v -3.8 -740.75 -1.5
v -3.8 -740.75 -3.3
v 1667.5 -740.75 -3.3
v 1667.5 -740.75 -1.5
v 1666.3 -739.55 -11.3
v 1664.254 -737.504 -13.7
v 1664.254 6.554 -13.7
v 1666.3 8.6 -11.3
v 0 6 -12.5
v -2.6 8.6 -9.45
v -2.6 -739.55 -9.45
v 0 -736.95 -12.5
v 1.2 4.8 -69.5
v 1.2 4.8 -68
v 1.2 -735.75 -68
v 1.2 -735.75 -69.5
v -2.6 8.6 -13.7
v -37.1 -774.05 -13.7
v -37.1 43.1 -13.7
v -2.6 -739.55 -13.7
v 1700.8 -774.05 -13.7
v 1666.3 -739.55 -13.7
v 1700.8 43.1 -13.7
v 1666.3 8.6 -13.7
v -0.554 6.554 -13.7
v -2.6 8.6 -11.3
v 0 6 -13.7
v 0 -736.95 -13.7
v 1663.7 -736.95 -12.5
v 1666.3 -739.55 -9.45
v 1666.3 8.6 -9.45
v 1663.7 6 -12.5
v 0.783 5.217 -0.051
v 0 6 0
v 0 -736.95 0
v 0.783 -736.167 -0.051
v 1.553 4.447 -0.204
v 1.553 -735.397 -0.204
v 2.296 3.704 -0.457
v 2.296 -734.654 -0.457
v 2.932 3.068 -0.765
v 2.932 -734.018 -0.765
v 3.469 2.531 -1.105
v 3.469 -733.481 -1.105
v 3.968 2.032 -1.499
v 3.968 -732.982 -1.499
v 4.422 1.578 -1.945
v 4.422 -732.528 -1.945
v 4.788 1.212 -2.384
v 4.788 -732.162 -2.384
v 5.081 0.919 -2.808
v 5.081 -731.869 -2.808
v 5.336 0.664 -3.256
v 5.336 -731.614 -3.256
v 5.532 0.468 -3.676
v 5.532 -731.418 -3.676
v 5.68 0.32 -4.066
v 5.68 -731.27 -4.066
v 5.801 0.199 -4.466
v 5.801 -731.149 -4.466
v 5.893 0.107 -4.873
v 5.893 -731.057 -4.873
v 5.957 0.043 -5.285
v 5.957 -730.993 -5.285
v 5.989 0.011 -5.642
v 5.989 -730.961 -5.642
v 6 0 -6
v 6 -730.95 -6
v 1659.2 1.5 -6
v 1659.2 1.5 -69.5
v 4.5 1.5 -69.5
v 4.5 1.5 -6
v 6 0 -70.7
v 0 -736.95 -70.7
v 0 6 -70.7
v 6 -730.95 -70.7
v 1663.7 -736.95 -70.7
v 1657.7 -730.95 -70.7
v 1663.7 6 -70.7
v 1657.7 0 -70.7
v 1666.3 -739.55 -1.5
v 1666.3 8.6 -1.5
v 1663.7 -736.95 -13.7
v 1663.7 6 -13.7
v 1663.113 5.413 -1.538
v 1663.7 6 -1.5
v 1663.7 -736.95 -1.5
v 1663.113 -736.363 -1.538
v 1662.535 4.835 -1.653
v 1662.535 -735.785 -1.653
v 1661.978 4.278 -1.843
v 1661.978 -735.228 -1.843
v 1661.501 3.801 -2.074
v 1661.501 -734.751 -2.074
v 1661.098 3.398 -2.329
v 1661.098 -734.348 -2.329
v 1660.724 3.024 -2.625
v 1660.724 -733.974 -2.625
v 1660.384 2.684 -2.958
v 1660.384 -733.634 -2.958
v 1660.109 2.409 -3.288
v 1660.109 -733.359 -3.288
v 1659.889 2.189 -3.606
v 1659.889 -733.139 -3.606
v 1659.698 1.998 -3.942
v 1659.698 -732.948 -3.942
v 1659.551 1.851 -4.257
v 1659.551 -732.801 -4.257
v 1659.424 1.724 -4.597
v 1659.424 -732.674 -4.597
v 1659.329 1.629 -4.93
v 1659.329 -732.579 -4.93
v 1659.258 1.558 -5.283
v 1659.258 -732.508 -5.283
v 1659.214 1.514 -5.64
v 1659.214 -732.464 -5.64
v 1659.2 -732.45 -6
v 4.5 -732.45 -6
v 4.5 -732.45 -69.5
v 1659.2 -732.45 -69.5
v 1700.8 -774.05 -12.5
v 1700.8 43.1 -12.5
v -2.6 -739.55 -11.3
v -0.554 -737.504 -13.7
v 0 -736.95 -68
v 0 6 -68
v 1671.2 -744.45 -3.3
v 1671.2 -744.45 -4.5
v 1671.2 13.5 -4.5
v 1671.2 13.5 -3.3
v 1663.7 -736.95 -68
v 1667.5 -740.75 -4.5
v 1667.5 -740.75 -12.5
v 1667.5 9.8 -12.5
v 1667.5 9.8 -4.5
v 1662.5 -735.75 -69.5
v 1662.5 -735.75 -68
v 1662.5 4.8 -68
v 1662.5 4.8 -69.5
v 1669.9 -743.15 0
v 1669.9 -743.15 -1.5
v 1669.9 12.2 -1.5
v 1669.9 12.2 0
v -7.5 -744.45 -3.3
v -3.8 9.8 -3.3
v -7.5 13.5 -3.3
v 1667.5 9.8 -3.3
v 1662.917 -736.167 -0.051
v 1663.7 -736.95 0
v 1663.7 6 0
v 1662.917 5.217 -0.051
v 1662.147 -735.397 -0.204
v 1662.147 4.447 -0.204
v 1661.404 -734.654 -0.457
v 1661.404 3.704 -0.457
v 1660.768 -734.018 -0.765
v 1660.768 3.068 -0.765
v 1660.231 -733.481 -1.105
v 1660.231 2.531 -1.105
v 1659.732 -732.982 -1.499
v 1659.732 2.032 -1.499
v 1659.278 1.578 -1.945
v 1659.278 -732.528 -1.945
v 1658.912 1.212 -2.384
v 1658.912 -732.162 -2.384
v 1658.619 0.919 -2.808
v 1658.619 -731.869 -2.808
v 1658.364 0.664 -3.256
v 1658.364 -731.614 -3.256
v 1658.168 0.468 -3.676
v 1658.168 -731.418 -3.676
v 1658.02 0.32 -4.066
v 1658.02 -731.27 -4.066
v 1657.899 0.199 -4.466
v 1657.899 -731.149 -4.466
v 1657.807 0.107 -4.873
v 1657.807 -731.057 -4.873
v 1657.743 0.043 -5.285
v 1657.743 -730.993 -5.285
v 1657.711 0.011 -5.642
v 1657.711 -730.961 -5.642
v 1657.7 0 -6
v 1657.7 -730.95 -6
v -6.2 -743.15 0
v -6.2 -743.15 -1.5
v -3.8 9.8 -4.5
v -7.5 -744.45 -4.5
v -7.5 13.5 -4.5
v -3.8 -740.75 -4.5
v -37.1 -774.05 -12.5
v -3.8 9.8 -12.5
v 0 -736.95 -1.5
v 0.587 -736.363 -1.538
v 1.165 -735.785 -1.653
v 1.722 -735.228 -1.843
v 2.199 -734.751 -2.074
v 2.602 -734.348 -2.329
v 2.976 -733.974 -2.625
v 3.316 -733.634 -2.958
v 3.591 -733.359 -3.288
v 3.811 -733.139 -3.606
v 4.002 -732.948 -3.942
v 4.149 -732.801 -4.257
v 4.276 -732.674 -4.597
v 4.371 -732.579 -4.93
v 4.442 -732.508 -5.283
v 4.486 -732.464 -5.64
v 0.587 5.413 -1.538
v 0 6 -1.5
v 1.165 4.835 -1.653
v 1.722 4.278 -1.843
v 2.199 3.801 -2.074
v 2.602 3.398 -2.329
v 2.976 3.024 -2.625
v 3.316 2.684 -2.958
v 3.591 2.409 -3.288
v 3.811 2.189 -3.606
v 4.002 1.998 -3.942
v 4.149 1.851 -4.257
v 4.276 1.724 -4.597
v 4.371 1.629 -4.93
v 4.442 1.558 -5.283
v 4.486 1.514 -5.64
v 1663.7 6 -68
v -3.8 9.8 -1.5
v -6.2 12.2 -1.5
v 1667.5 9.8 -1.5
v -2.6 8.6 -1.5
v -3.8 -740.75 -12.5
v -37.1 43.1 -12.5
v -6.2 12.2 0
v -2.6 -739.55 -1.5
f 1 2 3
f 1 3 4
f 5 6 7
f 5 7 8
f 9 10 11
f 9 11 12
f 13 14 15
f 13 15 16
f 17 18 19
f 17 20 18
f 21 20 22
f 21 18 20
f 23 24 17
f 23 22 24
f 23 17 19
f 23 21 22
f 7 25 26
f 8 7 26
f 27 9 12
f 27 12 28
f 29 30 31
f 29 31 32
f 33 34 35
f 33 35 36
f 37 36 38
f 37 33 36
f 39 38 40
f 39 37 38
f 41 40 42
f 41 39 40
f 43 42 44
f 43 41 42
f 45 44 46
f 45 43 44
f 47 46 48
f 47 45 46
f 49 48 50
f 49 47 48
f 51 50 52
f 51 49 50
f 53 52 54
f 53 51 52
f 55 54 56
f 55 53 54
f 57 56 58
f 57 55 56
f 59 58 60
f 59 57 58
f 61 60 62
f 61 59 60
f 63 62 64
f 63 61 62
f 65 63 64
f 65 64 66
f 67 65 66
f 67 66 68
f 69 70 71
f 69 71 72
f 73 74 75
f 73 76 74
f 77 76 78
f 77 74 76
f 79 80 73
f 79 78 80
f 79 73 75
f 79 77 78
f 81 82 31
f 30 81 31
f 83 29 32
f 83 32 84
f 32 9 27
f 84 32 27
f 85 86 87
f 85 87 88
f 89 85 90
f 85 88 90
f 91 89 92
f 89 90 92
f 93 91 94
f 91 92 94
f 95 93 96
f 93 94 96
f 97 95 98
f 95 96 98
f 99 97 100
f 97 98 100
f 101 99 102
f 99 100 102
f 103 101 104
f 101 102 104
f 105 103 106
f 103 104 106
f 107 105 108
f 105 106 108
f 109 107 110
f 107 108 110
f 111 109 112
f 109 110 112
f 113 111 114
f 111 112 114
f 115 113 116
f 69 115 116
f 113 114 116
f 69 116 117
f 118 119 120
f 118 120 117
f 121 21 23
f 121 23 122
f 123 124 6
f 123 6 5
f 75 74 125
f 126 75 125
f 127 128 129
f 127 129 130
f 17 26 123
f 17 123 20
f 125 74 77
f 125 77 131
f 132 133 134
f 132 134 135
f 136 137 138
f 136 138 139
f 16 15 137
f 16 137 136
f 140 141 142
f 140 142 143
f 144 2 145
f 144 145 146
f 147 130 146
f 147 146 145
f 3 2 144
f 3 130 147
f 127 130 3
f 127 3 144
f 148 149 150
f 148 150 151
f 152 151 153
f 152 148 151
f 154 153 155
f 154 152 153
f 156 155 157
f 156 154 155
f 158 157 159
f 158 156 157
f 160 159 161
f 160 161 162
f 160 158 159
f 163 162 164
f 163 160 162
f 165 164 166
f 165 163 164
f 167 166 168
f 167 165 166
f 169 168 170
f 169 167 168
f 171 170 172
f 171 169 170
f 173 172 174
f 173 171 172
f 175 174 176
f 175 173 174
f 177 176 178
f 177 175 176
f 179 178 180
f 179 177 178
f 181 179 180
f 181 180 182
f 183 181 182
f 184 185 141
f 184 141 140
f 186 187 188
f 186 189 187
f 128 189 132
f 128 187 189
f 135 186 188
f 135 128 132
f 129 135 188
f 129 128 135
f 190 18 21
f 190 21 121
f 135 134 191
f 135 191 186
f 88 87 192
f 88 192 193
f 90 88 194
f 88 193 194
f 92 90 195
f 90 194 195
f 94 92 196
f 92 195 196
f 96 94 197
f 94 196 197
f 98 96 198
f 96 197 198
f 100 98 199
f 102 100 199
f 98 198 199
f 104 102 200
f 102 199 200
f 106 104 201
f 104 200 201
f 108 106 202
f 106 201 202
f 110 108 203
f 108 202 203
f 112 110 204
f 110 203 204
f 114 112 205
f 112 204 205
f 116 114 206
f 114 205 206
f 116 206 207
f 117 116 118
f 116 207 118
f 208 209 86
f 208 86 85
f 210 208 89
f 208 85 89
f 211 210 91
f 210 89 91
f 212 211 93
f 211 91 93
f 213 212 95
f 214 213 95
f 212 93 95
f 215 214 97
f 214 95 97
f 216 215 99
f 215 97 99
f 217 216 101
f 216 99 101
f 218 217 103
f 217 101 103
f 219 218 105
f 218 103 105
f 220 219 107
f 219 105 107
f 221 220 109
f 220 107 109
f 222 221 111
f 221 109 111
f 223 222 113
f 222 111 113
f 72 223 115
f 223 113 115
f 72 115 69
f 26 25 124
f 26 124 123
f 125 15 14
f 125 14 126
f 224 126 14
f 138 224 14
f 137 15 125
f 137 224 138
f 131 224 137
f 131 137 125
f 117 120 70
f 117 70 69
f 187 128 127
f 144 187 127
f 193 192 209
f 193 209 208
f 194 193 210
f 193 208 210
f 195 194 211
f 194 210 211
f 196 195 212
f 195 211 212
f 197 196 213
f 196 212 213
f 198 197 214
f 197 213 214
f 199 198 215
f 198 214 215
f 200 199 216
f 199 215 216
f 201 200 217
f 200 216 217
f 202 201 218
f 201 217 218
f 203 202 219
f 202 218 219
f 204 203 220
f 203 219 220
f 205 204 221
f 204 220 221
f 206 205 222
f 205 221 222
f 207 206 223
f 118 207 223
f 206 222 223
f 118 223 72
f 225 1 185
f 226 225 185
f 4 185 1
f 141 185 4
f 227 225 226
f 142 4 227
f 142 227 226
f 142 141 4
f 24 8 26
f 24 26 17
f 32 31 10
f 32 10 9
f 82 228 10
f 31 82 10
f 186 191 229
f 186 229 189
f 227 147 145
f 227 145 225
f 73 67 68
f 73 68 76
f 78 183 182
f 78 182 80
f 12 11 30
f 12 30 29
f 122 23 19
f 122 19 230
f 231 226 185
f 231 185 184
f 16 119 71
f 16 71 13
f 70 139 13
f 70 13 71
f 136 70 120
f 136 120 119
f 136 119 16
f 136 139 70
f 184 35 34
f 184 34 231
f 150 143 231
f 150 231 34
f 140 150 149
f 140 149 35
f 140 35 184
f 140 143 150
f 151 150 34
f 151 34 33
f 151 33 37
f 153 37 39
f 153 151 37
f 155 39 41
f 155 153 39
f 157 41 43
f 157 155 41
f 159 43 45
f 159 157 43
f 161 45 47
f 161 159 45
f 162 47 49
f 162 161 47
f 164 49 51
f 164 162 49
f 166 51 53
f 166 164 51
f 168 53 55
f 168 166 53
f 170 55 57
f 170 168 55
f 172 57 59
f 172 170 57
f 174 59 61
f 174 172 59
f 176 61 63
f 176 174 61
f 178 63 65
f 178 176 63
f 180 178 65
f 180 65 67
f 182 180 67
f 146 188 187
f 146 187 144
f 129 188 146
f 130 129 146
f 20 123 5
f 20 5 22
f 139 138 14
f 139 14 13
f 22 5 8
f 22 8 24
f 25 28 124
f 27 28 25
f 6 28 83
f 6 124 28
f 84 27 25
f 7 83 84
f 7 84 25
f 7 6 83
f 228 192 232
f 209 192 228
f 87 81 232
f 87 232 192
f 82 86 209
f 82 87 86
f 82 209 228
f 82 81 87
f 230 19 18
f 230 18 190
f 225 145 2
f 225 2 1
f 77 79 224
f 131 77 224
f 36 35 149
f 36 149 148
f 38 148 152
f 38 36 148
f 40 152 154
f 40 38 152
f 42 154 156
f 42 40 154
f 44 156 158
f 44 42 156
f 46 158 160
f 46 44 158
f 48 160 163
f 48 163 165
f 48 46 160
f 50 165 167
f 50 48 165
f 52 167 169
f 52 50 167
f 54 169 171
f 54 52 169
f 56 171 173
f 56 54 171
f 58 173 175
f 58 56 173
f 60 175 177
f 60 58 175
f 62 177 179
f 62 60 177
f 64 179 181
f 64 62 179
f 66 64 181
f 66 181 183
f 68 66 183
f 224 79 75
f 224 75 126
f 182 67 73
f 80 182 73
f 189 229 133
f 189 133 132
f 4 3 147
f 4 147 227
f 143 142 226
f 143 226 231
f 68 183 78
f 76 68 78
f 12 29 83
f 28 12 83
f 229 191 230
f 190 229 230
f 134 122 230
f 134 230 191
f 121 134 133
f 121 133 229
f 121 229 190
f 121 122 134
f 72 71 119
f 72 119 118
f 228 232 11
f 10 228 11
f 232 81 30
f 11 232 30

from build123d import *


with BuildPart() as f2:
    # F2: sweep along a path in F1
    with BuildLine(Plane.XY) as f2_path:
        Line((0, 6), (1663.7, 6))
        Line((1663.7, 6), (1663.7, -736.95))
        Line((1663.7, -736.95), (0, -736.95))
        Line((0, -736.95), (0, 6))
    # F0 (on Right) → F2 (sweep)
    with BuildSketch(Plane.YZ):
        with BuildLine():
            Line((0, -6), (0, -70.7))
            Line((0, -70.7), (6, -70.7))
            Line((6, -70.7), (6, -68))
            Line((6, -68), (4.8, -68))
            Line((4.8, -68), (4.8, -69.5))
            Line((4.8, -69.5), (1.5, -69.5))
            Line((1.5, -69.5), (1.5, -6))
            ThreePointArc((1.5, -6), (2.8180194847, -2.8180194847), (6, -1.5))
            Line((6, -1.5), (8.6, -1.5))
            Line((8.6, -1.5), (8.6, -9.4503759398))
            Line((8.6, -9.4503759398), (6, -12.5))
            Line((6, -12.5), (6, -13.7))
            Line((6, -13.7), (6.5538461538, -13.7))
            Line((6.5538461538, -13.7), (8.6, -11.3))
            Line((8.6, -11.3), (8.6, -13.7))
            Line((8.6, -13.7), (43.1, -13.7))
            Line((43.1, -13.7), (43.1, -12.5))
            Line((43.1, -12.5), (9.8, -12.5))
            Line((9.8, -12.5), (9.8, -4.5))
            Line((9.8, -4.5), (13.5, -4.5))
            Line((13.5, -4.5), (13.5, -3.3))
            Line((13.5, -3.3), (9.8, -3.3))
            Line((9.8, -3.3), (9.8, -1.5))
            Line((9.8, -1.5), (12.2, -1.5))
            Line((12.2, -1.5), (12.2, 0))
            Line((12.2, 0), (6, 0))
            ThreePointArc((6, 0), (1.7573593129, -1.7573593129), (0, -6))
        make_face()
    sweep(path=f2_path.line, transition=Transition.RIGHT)


solid = f2.part
